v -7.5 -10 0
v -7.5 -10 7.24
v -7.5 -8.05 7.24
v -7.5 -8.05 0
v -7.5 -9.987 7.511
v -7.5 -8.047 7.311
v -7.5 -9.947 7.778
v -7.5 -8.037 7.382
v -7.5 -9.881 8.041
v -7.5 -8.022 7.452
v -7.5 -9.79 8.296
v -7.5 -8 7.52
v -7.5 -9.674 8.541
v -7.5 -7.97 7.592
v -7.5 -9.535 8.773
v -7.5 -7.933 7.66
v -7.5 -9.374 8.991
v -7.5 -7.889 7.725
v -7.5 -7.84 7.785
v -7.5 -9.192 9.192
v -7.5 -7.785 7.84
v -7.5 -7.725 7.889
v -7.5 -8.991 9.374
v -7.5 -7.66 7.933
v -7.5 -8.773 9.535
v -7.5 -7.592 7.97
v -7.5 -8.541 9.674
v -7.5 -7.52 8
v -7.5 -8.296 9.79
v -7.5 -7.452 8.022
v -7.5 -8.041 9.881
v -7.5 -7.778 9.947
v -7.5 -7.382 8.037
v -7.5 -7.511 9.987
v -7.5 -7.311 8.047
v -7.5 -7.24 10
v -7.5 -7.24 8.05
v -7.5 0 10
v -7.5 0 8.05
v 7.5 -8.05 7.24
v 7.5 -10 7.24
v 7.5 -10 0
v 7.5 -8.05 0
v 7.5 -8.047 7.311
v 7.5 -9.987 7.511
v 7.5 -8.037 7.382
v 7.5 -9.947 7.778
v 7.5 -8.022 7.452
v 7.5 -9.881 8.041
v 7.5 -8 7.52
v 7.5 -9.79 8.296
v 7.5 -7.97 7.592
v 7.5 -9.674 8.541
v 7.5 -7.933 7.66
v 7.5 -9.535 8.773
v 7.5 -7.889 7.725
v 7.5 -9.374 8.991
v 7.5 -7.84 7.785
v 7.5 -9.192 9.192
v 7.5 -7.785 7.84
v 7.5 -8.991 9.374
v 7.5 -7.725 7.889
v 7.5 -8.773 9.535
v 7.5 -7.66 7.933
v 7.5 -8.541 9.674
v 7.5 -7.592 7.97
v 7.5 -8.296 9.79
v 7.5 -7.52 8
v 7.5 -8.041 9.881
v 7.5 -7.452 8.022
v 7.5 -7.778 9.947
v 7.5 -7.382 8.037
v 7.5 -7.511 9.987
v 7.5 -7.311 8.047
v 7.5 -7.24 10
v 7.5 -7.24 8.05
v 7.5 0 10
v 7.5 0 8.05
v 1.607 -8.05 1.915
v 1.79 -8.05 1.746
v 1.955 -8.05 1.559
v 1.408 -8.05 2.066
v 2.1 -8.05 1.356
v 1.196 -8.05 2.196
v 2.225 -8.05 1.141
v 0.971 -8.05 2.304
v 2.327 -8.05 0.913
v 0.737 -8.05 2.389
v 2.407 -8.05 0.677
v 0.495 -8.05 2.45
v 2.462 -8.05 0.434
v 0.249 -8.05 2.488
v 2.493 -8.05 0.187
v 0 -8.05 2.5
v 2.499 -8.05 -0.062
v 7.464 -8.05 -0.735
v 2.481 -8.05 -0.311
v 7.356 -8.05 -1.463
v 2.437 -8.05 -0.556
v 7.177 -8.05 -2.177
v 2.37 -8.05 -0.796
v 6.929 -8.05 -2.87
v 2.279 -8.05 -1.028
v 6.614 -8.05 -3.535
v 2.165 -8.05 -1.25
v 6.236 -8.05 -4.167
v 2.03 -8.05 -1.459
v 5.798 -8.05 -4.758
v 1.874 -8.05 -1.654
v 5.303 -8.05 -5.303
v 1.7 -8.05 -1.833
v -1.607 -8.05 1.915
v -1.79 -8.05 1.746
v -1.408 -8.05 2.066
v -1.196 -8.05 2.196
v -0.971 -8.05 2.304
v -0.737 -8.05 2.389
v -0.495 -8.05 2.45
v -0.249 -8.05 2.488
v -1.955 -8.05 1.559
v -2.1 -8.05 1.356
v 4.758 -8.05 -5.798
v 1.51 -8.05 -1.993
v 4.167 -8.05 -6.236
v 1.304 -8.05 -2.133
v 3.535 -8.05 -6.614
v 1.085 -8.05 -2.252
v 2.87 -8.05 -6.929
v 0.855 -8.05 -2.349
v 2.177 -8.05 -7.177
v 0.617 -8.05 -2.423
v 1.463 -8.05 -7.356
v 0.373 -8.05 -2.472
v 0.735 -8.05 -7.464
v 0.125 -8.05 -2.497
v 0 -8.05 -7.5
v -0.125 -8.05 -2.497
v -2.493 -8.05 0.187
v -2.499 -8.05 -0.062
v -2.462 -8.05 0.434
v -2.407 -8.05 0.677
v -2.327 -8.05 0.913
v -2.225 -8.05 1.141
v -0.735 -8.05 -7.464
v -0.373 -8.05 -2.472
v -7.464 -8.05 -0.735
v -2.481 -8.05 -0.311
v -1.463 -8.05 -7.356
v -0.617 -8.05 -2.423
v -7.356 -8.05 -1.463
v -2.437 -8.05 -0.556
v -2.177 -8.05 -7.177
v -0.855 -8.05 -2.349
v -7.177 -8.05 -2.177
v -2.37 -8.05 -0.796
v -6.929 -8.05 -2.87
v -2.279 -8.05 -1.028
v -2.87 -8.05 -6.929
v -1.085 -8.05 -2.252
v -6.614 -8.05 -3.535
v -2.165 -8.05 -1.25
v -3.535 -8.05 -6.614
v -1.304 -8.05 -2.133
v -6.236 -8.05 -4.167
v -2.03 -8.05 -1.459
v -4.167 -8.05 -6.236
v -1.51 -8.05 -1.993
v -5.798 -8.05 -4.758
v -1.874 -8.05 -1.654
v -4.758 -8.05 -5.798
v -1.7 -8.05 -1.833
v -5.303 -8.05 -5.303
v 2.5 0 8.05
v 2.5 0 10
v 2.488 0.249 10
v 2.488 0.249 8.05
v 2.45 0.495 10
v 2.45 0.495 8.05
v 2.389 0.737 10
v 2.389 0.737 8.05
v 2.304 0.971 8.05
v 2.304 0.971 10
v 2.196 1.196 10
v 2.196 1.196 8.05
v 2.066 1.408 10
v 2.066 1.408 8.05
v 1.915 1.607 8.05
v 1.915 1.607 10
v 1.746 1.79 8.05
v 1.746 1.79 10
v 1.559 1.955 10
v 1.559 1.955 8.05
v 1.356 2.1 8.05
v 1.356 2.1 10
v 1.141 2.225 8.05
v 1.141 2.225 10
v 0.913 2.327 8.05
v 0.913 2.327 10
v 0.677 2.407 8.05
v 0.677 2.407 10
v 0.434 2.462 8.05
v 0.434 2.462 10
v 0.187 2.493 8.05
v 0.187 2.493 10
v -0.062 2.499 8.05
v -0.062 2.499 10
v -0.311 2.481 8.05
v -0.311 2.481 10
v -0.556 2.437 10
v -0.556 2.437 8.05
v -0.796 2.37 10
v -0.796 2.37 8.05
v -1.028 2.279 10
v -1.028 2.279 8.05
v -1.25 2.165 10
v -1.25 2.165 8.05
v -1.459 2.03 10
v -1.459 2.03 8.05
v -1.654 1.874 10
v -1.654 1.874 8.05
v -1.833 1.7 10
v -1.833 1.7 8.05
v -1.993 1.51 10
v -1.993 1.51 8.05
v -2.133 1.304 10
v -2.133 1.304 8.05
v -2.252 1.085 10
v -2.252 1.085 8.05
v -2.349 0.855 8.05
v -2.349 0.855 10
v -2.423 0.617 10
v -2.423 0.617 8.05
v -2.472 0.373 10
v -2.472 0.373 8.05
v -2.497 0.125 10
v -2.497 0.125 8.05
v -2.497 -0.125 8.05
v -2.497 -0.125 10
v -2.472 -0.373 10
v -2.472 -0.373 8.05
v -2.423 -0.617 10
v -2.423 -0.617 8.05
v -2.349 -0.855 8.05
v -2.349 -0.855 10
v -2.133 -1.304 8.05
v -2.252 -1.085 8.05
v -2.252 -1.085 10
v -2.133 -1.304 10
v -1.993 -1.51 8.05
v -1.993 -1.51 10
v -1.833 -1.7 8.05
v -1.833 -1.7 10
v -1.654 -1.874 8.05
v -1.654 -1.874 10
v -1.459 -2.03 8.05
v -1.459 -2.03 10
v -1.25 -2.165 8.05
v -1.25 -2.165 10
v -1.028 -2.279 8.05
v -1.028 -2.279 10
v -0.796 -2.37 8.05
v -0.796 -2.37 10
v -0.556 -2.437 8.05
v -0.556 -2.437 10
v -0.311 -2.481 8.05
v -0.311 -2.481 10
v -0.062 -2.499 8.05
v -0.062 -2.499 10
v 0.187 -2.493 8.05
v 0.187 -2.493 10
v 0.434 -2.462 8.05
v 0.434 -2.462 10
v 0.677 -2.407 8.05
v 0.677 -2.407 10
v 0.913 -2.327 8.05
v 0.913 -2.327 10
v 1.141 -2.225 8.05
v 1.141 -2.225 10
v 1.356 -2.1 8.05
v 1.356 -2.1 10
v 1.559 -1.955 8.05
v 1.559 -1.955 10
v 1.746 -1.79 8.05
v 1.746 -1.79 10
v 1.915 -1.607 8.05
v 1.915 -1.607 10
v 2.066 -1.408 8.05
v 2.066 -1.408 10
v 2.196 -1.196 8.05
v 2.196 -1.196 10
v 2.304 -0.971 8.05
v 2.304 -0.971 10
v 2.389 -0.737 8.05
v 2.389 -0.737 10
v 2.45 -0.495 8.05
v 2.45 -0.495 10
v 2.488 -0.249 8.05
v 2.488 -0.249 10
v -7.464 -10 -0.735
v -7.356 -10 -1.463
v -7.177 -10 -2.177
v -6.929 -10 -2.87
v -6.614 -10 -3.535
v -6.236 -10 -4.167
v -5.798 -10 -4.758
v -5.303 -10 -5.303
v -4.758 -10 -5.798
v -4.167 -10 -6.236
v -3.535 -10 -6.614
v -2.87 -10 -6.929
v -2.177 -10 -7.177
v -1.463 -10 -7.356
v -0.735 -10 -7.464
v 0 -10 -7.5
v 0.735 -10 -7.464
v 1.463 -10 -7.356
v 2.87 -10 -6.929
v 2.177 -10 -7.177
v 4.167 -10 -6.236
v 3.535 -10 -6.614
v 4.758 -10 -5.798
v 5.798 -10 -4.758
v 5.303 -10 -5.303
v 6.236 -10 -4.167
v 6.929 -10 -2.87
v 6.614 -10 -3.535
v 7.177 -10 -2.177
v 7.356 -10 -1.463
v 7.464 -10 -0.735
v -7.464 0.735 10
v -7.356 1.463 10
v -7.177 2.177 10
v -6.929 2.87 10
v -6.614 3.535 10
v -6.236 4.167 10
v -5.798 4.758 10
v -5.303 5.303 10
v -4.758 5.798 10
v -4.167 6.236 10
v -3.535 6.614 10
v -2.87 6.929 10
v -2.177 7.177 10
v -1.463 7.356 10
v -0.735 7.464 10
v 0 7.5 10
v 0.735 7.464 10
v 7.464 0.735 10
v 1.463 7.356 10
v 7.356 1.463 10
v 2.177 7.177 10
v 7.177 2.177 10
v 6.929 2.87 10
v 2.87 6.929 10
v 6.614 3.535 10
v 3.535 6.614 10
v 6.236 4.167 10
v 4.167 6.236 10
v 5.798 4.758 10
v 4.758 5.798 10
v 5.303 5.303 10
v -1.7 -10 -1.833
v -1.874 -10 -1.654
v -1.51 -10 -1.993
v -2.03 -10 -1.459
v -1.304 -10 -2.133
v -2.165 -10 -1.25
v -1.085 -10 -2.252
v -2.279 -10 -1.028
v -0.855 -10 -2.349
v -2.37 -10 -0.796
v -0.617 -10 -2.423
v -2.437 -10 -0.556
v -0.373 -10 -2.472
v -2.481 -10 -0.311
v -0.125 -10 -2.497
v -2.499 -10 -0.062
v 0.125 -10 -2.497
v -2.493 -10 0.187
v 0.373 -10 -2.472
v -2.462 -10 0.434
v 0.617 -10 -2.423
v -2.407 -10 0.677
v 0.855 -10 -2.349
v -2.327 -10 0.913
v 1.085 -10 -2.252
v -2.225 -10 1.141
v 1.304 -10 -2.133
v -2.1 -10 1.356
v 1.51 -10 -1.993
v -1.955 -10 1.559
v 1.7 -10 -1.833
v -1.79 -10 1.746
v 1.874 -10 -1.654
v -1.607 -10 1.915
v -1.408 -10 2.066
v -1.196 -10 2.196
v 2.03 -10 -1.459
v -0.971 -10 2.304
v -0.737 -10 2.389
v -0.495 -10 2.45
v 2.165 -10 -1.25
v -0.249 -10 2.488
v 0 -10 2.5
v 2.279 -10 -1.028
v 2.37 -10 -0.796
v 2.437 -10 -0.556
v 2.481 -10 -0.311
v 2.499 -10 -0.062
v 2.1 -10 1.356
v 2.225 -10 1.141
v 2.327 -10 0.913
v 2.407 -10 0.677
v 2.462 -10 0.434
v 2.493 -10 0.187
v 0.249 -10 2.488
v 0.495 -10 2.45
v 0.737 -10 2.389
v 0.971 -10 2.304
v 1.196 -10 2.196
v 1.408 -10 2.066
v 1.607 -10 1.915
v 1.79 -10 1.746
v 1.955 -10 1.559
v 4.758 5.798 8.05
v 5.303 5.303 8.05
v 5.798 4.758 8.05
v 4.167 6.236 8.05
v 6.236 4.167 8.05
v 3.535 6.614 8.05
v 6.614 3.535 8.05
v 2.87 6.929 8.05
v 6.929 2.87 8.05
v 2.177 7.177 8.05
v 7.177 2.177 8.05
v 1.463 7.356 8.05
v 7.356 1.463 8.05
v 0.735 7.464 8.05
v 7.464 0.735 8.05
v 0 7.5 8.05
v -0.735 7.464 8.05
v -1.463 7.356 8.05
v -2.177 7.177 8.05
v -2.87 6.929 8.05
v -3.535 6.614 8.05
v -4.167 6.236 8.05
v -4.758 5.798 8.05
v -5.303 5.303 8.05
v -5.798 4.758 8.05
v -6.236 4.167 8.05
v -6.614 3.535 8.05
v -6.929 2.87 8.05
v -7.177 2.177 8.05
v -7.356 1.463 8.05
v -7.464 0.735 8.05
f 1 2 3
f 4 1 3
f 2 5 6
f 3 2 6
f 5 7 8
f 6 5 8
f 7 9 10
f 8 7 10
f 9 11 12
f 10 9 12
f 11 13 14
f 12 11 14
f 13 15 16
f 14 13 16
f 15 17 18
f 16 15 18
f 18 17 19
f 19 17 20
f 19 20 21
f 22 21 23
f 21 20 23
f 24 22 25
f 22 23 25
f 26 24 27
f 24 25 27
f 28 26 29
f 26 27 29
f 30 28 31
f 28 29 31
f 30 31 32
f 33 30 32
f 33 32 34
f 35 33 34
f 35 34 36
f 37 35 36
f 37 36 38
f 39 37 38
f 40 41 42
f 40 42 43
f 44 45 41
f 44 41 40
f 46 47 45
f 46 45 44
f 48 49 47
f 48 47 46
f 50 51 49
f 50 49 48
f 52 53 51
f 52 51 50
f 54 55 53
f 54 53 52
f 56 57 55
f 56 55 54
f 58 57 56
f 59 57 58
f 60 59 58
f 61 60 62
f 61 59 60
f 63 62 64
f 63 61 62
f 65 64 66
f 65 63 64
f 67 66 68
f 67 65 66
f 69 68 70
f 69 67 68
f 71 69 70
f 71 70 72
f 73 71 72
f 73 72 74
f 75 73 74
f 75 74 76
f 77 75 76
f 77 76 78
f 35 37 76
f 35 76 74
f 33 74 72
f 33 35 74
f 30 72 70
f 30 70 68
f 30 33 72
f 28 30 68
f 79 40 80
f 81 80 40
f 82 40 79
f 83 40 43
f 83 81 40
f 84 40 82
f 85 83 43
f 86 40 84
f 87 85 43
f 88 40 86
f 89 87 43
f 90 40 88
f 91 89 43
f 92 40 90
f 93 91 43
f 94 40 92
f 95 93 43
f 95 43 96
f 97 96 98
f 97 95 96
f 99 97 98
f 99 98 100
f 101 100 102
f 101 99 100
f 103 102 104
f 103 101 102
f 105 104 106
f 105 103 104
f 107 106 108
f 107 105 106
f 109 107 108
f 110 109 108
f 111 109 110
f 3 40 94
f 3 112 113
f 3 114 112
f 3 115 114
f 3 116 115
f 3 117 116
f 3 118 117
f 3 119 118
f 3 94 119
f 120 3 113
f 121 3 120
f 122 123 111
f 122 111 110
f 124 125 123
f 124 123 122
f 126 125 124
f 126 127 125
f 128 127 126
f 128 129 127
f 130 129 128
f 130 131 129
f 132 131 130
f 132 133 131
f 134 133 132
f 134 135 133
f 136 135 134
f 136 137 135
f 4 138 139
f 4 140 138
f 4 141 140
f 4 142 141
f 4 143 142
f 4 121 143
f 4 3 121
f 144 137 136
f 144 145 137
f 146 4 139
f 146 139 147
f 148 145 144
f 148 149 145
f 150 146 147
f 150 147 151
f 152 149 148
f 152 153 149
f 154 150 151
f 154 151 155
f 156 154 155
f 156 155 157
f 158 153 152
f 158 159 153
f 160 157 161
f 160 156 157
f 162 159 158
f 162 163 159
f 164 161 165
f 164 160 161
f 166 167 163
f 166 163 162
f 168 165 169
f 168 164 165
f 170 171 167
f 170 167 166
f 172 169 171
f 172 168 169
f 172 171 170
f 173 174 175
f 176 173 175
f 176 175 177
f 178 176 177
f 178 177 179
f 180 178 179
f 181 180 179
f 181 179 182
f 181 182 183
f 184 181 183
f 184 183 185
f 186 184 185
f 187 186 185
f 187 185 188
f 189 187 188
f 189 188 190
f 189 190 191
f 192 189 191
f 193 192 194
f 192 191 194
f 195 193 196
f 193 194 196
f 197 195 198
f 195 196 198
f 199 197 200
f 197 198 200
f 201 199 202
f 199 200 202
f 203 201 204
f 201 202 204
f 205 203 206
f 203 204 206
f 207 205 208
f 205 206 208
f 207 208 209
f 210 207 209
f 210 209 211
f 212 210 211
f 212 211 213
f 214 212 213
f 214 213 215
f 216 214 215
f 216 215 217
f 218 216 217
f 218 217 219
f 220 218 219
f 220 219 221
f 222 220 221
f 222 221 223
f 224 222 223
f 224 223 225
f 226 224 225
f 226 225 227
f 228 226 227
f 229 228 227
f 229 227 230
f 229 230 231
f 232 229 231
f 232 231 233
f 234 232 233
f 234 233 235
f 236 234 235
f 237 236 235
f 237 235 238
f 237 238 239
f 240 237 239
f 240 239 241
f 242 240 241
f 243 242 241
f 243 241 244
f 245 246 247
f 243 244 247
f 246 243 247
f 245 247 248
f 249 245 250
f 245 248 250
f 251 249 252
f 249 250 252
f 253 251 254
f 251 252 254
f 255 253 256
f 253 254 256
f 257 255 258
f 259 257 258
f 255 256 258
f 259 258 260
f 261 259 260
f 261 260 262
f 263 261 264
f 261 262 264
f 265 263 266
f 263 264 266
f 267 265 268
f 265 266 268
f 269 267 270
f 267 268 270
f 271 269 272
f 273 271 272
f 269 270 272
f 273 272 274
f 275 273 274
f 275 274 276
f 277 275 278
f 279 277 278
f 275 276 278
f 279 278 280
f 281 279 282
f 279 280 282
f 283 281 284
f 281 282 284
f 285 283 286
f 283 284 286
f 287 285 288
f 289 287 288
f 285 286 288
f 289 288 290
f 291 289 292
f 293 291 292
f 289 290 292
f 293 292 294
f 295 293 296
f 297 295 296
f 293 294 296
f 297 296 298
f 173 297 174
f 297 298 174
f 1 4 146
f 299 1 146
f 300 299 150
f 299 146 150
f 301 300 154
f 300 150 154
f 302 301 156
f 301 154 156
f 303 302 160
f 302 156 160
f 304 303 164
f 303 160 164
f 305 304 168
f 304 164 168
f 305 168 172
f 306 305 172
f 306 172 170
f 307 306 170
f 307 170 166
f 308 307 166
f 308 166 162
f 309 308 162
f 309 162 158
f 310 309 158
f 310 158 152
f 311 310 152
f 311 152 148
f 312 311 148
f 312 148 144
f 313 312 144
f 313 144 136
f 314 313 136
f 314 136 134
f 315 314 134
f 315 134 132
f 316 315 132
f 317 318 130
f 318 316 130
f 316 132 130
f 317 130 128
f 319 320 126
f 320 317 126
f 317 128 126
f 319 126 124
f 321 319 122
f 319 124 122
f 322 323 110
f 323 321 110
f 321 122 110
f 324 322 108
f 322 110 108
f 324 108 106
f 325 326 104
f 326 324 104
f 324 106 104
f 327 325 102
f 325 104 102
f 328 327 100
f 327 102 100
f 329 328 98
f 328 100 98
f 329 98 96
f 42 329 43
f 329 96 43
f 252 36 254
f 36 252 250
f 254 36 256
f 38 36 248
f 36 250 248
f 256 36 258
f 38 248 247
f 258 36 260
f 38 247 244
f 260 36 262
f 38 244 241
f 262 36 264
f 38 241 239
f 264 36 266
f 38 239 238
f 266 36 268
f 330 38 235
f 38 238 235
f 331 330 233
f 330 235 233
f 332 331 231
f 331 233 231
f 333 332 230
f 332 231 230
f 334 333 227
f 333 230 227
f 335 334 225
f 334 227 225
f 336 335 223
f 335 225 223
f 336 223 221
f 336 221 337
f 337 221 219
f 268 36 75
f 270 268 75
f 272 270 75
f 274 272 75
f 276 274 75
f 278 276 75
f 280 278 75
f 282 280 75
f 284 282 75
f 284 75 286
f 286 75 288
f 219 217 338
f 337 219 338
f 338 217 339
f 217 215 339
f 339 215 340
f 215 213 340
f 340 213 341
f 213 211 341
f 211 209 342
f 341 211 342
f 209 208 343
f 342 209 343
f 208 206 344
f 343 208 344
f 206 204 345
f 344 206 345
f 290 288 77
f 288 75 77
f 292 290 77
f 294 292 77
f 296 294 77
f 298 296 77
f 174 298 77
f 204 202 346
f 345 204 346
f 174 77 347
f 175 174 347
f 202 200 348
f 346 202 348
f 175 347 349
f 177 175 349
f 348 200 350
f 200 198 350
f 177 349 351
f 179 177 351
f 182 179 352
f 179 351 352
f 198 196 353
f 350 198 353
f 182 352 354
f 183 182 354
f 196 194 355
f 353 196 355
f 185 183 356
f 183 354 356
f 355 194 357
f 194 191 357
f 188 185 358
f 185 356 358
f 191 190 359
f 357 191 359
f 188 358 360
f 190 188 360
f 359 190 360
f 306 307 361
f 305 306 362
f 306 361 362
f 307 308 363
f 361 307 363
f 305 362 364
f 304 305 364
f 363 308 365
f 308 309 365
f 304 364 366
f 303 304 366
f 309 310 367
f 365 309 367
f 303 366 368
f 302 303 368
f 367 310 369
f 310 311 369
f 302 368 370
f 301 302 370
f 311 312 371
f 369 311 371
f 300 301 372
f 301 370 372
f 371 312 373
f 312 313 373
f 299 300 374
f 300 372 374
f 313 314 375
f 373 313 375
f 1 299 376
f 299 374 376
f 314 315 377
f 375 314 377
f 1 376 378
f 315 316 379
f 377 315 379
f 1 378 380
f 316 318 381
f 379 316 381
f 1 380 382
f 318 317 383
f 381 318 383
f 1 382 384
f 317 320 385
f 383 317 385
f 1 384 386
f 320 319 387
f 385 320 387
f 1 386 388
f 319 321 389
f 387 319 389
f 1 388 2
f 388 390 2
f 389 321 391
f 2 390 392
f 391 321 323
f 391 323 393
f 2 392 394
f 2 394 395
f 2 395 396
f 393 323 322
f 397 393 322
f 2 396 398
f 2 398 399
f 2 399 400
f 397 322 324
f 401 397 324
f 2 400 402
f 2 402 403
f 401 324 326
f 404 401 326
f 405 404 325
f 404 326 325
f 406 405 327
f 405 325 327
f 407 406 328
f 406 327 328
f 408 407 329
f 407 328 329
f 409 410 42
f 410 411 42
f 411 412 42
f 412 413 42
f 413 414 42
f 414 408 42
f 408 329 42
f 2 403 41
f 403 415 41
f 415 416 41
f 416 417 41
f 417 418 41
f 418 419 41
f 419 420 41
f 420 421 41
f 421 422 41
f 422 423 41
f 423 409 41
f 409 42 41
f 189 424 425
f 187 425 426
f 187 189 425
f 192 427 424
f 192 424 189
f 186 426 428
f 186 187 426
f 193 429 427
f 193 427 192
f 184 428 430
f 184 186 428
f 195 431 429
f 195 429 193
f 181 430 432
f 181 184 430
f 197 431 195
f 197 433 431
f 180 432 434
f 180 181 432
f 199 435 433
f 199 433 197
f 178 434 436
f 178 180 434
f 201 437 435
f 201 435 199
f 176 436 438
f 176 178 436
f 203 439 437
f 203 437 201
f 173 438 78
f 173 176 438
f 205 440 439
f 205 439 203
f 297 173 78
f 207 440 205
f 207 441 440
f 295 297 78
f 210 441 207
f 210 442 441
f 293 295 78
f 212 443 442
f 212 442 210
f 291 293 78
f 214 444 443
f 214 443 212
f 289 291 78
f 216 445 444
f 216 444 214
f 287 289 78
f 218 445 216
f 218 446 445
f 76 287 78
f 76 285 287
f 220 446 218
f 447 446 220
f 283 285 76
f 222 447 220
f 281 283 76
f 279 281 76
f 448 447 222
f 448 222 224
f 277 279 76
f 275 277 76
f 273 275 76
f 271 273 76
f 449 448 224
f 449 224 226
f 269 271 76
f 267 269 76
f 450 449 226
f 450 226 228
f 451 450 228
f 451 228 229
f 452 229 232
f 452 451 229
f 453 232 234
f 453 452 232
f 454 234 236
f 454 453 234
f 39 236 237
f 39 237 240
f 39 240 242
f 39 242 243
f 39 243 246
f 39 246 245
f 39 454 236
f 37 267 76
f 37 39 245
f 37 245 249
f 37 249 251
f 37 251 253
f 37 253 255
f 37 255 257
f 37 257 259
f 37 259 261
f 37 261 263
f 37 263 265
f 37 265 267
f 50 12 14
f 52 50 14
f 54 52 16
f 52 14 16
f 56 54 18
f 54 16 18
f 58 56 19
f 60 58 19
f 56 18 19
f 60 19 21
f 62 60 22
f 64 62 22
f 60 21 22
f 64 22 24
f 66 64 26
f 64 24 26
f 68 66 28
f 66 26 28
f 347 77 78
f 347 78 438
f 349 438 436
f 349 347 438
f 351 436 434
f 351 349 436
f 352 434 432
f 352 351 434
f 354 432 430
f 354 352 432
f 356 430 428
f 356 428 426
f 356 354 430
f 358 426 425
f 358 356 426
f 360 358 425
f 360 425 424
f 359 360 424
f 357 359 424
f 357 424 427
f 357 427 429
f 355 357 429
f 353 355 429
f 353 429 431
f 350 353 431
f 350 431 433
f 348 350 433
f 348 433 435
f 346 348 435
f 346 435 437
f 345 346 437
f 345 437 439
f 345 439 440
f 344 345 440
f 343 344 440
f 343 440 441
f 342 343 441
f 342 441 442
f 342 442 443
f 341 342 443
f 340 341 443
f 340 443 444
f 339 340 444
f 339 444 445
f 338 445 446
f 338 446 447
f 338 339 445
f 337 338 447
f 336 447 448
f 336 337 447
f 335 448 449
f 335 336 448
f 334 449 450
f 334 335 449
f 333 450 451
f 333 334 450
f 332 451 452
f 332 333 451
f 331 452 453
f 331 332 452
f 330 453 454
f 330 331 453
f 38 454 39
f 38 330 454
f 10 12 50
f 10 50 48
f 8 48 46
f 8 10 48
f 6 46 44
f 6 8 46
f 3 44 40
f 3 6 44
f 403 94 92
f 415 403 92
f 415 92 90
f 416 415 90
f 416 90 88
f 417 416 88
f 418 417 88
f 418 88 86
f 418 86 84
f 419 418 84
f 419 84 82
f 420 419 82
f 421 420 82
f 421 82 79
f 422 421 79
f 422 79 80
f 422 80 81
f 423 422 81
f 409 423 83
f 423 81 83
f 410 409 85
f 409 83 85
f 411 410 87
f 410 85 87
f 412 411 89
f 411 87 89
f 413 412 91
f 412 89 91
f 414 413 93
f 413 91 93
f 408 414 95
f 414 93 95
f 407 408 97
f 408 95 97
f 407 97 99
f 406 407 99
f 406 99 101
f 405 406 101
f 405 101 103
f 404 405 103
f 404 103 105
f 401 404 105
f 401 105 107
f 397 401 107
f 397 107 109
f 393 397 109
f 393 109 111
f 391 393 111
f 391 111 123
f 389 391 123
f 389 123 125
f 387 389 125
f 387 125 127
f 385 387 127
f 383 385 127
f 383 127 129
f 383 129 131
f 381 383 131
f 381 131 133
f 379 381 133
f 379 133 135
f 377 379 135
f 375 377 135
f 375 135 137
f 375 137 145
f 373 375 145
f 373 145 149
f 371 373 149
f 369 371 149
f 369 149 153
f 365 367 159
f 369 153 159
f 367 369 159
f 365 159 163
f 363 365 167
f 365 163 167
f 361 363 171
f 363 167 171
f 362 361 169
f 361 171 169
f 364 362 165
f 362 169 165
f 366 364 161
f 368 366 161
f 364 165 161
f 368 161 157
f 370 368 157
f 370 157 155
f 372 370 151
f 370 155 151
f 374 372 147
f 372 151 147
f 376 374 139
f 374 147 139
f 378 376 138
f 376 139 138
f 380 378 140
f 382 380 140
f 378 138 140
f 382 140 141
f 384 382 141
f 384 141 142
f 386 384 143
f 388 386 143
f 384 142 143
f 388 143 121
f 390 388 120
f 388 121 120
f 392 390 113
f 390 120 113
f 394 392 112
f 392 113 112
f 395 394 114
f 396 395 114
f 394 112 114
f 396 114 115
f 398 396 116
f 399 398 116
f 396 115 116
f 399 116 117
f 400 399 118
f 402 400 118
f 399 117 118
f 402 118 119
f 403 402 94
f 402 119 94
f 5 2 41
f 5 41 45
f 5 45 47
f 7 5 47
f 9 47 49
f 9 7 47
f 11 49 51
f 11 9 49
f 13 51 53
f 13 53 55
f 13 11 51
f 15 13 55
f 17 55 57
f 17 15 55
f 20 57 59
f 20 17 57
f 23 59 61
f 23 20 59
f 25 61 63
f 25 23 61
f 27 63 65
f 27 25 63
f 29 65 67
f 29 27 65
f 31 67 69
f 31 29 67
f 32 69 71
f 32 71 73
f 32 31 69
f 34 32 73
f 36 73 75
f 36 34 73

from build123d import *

# Parameters (mm, degrees)
RESSALTO_EXTRUS_O1_DEPTH  = 7.5
CONVERTER_S_LIDO1_START   = -7.5
CONVERTER_S_LIDO1_DEPTH   = 15
CONVERTER_S_LIDO1_2_DEPTH = 15
ESBO_O6_R                 = 2.5
CORTE_EXTRUS_O1_DEPTH     = 2
ESBO_O7_R                 = 2.5
CORTE_EXTRUS_O2_DEPTH     = 2


# Read off the part's stored shape, not the designer's step: Converter-Sólido1
with BuildPart() as part:
    # Esboço1 → Ressalto-extrusão1 (new, symmetric)
    with BuildSketch(Plane(origin=(0, 0, 0), x_dir=(0, 0, -1), z_dir=(1, 0, 0))):
        Polygon((-8, 10), (-8, -8), (10, -8), (10, -10), (-10, -10), (-10, 10), align=None)
    extrude(amount=RESSALTO_EXTRUS_O1_DEPTH, both=True)

    # Converter-Sólido1 outline → Converter-Sólido1 (cut)
    with BuildSketch(Plane.YZ.offset(CONVERTER_S_LIDO1_START)):
        with BuildLine():
            Line((-10, 10), (-10, 7.24))
            ThreePointArc((-10, 7.24), (-9.191614716, 9.191614716), (-7.24, 10))
            Line((-7.24, 10), (-10, 10))
        make_face()
        with BuildLine():
            Line((-8.05, 7.24), (-8.05, -10))
            Line((-8.05, -10), (-8, -10))
            Line((-8, -10), (-8, 7.520178515))
            ThreePointArc((-8, 7.520178515), (-8.037402032, 7.382302495), (-8.05, 7.24))
        make_face()
        with BuildLine():
            Line((10, 8), (10, 8.05))
            Line((10, 8.05), (-7.24, 8.05))
            ThreePointArc((-7.24, 8.05), (-7.382302495, 8.037402032), (-7.520178515, 8))
            Line((-7.520178515, 8), (10, 8))
        make_face()
    extrude(amount=CONVERTER_S_LIDO1_DEPTH, mode=Mode.SUBTRACT)

    # Converter-S_lido1 2 outline → Converter-S_lido1 2 (add)
    with BuildSketch(Plane.YZ.offset(CONVERTER_S_LIDO1_START)):
        with BuildLine():
            Line((-8, 8), (-8, 7.520178515))
            ThreePointArc((-8, 7.520178515), (-7.812756493, 7.812756493), (-7.520178515, 8))
            Line((-7.520178515, 8), (-8, 8))
        make_face()
    extrude(amount=CONVERTER_S_LIDO1_2_DEPTH)

    # Esboço6 → Corte-extrusão1 (cut)
    with BuildSketch(Plane.XY.offset(10)):
        Circle(ESBO_O6_R)
        with BuildLine():
            Line((-7.5, 0), (-7.5, 10))
            Line((-7.5, 10), (7.5, 10))
            Line((7.5, 10), (7.5, 0))
            ThreePointArc((7.5, 0), (0, 7.5), (-7.5, 0))
        make_face()
    extrude(amount=-CORTE_EXTRUS_O1_DEPTH, mode=Mode.SUBTRACT)

    # Esboço7 → Corte-extrusão2 (cut)
    with BuildSketch(Plane(origin=(0, -8.05, 0), x_dir=(1, 0, 0), z_dir=(0, 1, 0))):
        with Locations(Location((0, 0, 0), (0, 0, 270))):
            Circle(ESBO_O7_R)
        with BuildLine():
            Line((7.5, 0), (7.5, 10))
            Line((7.5, 10), (-7.5, 10))
            Line((-7.5, 10), (-7.5, 0))
            ThreePointArc((-7.5, 0), (0, 7.5), (7.5, 0))
        make_face()
    extrude(amount=-CORTE_EXTRUS_O2_DEPTH, mode=Mode.SUBTRACT)


solid = part.part
